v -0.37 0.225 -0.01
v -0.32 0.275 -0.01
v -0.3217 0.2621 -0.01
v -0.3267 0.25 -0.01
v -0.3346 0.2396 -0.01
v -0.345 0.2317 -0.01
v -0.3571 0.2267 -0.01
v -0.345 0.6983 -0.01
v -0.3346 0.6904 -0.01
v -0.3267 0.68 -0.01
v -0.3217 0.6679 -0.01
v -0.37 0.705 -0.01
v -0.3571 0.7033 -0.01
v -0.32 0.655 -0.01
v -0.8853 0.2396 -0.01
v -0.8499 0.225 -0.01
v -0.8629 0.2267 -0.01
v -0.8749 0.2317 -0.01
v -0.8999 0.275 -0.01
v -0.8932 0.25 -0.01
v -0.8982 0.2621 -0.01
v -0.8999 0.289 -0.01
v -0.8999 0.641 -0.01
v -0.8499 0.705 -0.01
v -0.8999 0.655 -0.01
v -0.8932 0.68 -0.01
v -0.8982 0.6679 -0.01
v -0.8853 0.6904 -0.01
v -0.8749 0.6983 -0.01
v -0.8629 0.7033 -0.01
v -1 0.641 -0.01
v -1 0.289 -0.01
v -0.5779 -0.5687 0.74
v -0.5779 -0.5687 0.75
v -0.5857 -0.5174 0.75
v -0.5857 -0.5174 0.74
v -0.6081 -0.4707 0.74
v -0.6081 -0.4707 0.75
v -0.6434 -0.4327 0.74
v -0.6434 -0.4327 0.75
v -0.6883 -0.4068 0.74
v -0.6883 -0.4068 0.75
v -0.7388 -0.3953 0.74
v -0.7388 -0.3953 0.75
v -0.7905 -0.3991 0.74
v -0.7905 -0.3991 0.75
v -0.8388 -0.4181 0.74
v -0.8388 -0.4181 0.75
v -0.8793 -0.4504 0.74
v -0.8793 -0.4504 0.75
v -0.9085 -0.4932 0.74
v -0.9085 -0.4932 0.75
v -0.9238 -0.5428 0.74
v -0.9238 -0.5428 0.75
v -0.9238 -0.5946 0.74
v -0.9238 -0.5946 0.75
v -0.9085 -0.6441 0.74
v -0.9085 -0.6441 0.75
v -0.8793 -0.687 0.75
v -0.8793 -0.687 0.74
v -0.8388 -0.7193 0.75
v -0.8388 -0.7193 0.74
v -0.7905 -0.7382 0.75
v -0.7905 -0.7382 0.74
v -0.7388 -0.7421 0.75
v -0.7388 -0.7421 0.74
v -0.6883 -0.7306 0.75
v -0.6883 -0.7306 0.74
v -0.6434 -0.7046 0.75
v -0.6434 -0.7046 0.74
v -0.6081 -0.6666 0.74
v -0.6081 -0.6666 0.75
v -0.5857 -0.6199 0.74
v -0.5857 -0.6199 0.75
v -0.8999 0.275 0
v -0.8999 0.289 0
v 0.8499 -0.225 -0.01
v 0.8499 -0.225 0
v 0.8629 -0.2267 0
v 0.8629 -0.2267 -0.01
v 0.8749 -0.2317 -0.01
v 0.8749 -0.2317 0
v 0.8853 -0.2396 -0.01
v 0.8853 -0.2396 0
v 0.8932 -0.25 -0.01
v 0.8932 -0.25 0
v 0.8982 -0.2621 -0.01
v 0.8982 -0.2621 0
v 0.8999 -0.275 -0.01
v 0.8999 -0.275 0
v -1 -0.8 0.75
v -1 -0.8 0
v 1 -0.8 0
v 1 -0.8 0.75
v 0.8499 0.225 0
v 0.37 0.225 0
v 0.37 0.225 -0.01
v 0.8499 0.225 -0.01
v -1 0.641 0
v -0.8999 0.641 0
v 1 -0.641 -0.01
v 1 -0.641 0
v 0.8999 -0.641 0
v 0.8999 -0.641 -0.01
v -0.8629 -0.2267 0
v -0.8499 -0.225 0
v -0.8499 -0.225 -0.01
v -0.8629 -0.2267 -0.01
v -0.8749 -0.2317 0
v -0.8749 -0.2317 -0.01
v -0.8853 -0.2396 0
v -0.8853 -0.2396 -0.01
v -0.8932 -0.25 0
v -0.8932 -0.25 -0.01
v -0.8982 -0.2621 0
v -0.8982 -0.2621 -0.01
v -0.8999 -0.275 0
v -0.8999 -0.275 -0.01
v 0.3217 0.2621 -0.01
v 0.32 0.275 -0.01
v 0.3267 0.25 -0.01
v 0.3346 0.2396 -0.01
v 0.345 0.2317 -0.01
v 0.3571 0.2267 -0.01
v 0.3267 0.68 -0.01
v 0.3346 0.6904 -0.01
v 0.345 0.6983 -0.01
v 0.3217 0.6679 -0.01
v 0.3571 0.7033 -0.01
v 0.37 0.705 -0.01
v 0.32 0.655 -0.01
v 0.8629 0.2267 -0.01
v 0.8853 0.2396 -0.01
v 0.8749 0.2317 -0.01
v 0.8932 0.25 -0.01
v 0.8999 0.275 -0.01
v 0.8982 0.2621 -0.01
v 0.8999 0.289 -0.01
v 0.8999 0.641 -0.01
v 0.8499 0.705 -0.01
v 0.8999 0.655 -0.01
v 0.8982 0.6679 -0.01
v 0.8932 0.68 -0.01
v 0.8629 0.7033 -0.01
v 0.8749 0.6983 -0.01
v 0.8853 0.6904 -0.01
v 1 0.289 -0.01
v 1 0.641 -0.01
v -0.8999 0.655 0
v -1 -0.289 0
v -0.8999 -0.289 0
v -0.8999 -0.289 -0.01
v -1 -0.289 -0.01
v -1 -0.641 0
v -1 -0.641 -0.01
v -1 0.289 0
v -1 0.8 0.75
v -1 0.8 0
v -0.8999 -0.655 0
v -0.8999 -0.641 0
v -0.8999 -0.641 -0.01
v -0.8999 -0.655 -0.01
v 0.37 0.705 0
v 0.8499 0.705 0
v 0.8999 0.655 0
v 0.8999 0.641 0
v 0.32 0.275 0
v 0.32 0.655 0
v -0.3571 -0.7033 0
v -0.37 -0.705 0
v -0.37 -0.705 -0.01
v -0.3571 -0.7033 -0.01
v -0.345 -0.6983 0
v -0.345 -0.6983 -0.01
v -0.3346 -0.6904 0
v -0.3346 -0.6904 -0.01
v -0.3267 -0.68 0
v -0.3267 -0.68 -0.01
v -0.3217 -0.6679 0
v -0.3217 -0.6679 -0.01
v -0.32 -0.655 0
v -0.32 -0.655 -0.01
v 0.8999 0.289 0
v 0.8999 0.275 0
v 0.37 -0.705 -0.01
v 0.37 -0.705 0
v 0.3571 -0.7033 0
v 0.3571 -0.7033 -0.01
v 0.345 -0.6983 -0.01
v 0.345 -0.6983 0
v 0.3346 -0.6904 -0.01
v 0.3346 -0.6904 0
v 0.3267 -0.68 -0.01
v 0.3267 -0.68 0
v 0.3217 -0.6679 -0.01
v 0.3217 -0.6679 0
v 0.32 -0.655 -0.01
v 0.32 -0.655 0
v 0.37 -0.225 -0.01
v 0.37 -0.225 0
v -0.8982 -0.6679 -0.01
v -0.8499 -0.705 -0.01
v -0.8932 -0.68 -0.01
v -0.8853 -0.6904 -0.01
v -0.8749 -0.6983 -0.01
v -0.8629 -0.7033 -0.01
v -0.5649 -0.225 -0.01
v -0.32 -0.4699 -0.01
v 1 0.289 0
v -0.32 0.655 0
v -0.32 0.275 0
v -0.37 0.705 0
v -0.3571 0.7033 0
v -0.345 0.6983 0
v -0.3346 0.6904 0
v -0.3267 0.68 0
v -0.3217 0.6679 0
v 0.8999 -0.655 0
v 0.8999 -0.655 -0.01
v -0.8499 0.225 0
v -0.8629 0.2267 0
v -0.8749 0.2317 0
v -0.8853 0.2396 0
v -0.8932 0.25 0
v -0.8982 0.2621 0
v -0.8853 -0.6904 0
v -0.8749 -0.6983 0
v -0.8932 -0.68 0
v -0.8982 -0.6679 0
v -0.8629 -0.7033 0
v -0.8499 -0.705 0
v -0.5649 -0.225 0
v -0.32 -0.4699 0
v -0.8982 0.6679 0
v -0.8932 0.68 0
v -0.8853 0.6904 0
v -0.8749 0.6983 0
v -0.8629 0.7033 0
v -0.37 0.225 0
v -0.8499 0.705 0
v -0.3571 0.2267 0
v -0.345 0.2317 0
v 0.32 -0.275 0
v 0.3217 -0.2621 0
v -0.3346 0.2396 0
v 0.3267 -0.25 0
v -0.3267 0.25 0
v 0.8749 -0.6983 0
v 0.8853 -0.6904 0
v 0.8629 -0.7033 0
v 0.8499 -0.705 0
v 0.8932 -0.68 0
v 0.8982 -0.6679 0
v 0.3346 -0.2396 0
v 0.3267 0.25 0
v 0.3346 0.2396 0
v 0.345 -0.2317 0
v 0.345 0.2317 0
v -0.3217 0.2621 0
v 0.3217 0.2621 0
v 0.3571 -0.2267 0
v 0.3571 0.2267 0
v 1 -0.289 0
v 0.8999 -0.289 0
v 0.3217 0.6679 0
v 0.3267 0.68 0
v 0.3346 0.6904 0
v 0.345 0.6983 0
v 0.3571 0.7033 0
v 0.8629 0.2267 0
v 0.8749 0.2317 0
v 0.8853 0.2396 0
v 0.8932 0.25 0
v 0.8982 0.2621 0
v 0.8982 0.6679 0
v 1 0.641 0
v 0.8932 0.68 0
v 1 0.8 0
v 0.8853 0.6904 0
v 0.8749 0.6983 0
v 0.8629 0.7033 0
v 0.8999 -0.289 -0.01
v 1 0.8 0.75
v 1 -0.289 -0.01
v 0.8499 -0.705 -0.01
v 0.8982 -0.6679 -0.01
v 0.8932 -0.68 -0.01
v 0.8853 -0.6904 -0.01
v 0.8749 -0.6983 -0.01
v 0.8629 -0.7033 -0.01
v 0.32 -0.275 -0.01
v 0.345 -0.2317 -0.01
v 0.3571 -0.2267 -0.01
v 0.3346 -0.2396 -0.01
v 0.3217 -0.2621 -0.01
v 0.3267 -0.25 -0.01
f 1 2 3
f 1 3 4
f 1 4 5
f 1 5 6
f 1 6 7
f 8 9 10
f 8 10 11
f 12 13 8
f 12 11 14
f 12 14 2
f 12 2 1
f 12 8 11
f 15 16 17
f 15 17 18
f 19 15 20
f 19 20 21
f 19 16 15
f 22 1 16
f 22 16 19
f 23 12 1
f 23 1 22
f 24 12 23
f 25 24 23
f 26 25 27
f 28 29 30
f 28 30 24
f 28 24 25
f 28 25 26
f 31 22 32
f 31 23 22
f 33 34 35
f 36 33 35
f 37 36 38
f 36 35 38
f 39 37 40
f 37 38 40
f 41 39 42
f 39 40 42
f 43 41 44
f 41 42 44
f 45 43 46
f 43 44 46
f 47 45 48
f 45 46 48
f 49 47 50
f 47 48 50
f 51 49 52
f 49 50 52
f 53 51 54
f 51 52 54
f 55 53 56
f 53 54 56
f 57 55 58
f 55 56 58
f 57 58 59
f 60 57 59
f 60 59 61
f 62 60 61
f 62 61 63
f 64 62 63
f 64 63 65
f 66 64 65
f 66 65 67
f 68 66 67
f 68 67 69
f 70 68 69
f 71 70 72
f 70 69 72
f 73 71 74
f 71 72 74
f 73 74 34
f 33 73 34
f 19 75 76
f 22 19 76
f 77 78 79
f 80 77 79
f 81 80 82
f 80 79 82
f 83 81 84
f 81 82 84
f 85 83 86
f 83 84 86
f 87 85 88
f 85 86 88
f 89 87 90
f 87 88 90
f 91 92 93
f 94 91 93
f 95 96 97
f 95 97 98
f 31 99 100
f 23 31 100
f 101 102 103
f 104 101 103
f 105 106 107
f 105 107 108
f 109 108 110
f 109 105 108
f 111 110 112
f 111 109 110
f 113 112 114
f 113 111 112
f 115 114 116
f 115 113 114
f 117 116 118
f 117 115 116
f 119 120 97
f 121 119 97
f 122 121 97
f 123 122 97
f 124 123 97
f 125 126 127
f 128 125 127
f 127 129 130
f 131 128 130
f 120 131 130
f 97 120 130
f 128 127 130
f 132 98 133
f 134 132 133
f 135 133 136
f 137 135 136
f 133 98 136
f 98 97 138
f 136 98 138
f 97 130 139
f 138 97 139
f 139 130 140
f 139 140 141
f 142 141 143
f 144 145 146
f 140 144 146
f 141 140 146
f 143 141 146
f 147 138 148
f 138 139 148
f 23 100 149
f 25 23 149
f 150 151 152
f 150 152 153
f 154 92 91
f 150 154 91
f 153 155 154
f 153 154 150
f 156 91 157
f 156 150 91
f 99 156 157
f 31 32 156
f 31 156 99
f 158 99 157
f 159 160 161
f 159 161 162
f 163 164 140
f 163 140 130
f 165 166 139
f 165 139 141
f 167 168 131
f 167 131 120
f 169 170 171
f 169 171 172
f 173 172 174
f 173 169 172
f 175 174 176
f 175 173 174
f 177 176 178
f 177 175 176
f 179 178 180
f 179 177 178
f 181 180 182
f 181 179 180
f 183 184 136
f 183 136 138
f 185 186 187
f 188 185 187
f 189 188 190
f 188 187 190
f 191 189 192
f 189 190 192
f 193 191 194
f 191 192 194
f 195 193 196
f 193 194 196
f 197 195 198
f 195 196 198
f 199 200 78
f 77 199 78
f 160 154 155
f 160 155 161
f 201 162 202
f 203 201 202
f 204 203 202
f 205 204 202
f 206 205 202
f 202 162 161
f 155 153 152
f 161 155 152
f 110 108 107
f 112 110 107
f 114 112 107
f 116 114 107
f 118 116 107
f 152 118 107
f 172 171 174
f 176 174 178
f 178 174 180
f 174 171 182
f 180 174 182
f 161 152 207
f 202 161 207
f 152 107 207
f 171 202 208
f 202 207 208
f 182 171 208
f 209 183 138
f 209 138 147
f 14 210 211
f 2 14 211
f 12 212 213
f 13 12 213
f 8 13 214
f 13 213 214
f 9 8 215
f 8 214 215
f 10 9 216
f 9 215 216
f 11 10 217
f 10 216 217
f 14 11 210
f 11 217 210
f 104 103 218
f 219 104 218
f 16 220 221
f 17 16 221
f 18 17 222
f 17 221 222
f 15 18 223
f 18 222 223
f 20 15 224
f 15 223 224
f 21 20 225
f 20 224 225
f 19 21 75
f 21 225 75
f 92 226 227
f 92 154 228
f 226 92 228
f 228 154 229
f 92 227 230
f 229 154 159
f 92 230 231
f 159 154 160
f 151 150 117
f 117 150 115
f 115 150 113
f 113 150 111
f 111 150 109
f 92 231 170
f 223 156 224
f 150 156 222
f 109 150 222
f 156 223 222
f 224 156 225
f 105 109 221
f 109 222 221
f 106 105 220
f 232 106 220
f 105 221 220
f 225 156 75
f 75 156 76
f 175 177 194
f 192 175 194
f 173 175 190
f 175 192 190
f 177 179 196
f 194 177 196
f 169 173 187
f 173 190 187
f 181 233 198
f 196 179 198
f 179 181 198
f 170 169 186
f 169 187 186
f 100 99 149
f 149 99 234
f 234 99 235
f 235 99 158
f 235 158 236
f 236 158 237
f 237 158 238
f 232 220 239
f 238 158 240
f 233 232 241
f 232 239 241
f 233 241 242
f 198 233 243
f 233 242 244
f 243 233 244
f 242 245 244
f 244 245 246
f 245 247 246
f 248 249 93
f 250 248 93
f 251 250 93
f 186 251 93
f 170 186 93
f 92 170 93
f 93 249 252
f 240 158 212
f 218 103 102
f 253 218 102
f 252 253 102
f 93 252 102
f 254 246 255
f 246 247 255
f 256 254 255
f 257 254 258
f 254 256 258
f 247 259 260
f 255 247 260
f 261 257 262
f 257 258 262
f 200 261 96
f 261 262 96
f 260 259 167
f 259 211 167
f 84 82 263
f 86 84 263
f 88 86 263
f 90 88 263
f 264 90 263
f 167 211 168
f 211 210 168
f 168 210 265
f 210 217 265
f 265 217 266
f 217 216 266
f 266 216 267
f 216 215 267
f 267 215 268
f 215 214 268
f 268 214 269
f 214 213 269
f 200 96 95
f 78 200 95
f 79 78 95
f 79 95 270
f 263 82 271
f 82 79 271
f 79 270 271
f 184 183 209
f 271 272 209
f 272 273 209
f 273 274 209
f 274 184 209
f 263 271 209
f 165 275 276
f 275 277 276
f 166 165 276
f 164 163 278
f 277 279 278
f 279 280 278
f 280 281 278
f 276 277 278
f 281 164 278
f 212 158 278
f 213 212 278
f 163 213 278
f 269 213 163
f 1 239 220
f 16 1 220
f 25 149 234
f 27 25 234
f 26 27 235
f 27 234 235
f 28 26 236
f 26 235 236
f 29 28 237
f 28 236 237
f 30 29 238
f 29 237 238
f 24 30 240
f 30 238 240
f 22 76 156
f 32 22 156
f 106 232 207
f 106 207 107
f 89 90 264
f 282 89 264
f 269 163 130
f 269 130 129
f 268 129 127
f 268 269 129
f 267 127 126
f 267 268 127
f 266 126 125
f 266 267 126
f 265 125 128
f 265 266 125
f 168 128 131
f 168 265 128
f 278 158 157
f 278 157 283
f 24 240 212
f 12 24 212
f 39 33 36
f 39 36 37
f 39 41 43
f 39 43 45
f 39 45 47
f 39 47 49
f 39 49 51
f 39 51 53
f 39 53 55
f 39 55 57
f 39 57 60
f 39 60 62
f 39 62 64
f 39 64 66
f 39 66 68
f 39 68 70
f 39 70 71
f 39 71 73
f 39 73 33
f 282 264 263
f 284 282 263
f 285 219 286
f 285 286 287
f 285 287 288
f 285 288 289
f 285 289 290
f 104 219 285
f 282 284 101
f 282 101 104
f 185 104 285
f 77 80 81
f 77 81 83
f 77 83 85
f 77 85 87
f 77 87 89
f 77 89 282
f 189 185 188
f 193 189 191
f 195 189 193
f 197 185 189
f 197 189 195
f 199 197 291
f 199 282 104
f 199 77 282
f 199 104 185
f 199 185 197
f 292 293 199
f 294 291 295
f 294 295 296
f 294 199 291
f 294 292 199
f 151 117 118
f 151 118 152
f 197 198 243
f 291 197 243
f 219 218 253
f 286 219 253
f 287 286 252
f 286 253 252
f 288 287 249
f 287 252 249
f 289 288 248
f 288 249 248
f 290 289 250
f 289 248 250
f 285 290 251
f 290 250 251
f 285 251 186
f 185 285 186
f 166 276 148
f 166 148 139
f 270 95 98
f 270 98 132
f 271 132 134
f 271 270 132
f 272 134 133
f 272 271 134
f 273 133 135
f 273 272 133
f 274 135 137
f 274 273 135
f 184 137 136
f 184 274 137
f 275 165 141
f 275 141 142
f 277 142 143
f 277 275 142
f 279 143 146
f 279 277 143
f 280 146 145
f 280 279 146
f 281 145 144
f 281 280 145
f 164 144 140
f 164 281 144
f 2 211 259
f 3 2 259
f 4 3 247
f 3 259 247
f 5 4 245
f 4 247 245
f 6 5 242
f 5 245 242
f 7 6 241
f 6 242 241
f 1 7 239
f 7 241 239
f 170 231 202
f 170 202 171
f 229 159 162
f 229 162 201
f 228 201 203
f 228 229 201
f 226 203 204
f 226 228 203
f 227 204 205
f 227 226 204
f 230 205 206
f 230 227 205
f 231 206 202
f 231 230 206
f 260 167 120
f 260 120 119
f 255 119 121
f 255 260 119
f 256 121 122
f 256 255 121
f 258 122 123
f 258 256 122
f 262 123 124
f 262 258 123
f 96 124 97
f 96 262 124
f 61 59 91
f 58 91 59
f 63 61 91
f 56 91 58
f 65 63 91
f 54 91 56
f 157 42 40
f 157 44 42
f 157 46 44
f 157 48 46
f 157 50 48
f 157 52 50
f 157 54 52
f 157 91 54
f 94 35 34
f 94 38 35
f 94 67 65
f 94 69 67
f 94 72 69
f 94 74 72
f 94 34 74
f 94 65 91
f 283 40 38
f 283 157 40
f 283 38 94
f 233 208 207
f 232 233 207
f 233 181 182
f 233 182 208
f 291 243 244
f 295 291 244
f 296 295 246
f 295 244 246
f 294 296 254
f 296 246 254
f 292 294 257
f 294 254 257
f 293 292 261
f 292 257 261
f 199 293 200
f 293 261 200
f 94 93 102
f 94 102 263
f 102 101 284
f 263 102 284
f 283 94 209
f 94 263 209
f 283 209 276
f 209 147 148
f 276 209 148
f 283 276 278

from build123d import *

# Parameters (mm, degrees)
SKETCH1_W           = 2
SKETCH1_H           = 1.6
BOSS_EXTRUDE1_DEPTH = 0.75
BOSS_EXTRUDE2_DEPTH = 0.01
CUT_EXTRUDE1_DEPTH  = 0.01
SKETCH4_R           = 0.17390424
CUT_EXTRUDE2_DEPTH  = 0.01


with BuildPart() as part:
    # Sketch1 → Boss-Extrude1 (new body)
    with BuildSketch(Plane.XY):
        Rectangle(SKETCH1_W, SKETCH1_H)
    extrude(amount=BOSS_EXTRUDE1_DEPTH)

    # Sketch2 → Boss-Extrude2 (add)
    with BuildSketch(Plane.XY):
        with BuildLine():
            ThreePointArc((0.849921965, -0.225), (0.885277304, -0.239644661), (0.899921965, -0.275))
            Line((0.899921965, -0.275), (0.899921965, -0.28901736))
            Line((0.899921965, -0.28901736), (1, -0.28901736))
            Line((1, -0.28901736), (1, -0.64098264))
            Line((1, -0.64098264), (0.899921965, -0.64098264))
            Line((0.899921965, -0.64098264), (0.899921965, -0.655))
            ThreePointArc((0.899921965, -0.655), (0.885277304, -0.690355339), (0.849921965, -0.705))
            Line((0.849921965, -0.705), (0.37, -0.705))
            ThreePointArc((0.37, -0.705), (0.334644661, -0.690355339), (0.32, -0.655))
            Line((0.32, -0.655), (0.32, -0.275))
            ThreePointArc((0.32, -0.275), (0.334644661, -0.239644661), (0.37, -0.225))
            Line((0.37, -0.225), (0.849921965, -0.225))
        make_face()
        with BuildLine():
            ThreePointArc((-0.849921965, 0.225), (-0.885277304, 0.239644661), (-0.899921965, 0.275))
            Line((-0.899921965, 0.275), (-0.899921965, 0.28901736))
            Line((-0.899921965, 0.28901736), (-1, 0.28901736))
            Line((-1, 0.28901736), (-1, 0.64098264))
            Line((-1, 0.64098264), (-0.899921965, 0.64098264))
            Line((-0.899921965, 0.64098264), (-0.899921965, 0.655))
            ThreePointArc((-0.899921965, 0.655), (-0.885277304, 0.690355339), (-0.849921965, 0.705))
            Line((-0.849921965, 0.705), (-0.37, 0.705))
            ThreePointArc((-0.37, 0.705), (-0.334644661, 0.690355339), (-0.32, 0.655))
            Line((-0.32, 0.655), (-0.32, 0.275))
            ThreePointArc((-0.32, 0.275), (-0.334644661, 0.239644661), (-0.37, 0.225))
            Line((-0.37, 0.225), (-0.849921965, 0.225))
        make_face()
        with BuildLine():
            Line((-0.849921965, -0.705), (-0.37, -0.705))
            ThreePointArc((-0.37, -0.705), (-0.334644661, -0.690355339), (-0.32, -0.655))
            Line((-0.32, -0.655), (-0.32, -0.275))
            ThreePointArc((-0.32, -0.275), (-0.334644661, -0.239644661), (-0.37, -0.225))
            Line((-0.37, -0.225), (-0.849921965, -0.225))
            ThreePointArc((-0.849921965, -0.225), (-0.885277304, -0.239644661), (-0.899921965, -0.275))
            Line((-0.899921965, -0.275), (-0.899921965, -0.28901736))
            Line((-0.899921965, -0.28901736), (-1, -0.28901736))
            Line((-1, -0.28901736), (-1, -0.64098264))
            Line((-1, -0.64098264), (-0.899921965, -0.64098264))
            Line((-0.899921965, -0.64098264), (-0.899921965, -0.655))
            ThreePointArc((-0.899921965, -0.655), (-0.885277304, -0.690355339), (-0.849921965, -0.705))
        make_face()
        with BuildLine():
            Line((0.849921965, 0.705), (0.37, 0.705))
            ThreePointArc((0.37, 0.705), (0.334644661, 0.690355339), (0.32, 0.655))
            Line((0.32, 0.655), (0.32, 0.275))
            ThreePointArc((0.32, 0.275), (0.334644661, 0.239644661), (0.37, 0.225))
            Line((0.37, 0.225), (0.849921965, 0.225))
            ThreePointArc((0.849921965, 0.225), (0.885277304, 0.239644661), (0.899921965, 0.275))
            Line((0.899921965, 0.275), (0.899921965, 0.28901736))
            Line((0.899921965, 0.28901736), (1, 0.28901736))
            Line((1, 0.28901736), (1, 0.64098264))
            Line((1, 0.64098264), (0.899921965, 0.64098264))
            Line((0.899921965, 0.64098264), (0.899921965, 0.655))
            ThreePointArc((0.899921965, 0.655), (0.885277304, 0.690355339), (0.849921965, 0.705))
        make_face()
    extrude(amount=-BOSS_EXTRUDE2_DEPTH)

    # Sketch3 → Cut-Extrude1 (cut)
    with BuildSketch(Plane(origin=(0, 0, -0.01), x_dir=(-1, 0, 0), z_dir=(0, 0, -1))):
        Polygon((0.259506614, -0.530356554), (0.673891884, -0.115971284), (0.259506614, -0.115971284), align=None)
    extrude(amount=-CUT_EXTRUDE1_DEPTH, mode=Mode.SUBTRACT)

    # Sketch4 → Cut-Extrude2 (cut)
    with BuildSketch(Plane.XY.offset(0.75)):
        with Locations((-0.751829449, -0.568683388)):
            Circle(SKETCH4_R)
    extrude(amount=-CUT_EXTRUDE2_DEPTH, mode=Mode.SUBTRACT)


solid = part.part
